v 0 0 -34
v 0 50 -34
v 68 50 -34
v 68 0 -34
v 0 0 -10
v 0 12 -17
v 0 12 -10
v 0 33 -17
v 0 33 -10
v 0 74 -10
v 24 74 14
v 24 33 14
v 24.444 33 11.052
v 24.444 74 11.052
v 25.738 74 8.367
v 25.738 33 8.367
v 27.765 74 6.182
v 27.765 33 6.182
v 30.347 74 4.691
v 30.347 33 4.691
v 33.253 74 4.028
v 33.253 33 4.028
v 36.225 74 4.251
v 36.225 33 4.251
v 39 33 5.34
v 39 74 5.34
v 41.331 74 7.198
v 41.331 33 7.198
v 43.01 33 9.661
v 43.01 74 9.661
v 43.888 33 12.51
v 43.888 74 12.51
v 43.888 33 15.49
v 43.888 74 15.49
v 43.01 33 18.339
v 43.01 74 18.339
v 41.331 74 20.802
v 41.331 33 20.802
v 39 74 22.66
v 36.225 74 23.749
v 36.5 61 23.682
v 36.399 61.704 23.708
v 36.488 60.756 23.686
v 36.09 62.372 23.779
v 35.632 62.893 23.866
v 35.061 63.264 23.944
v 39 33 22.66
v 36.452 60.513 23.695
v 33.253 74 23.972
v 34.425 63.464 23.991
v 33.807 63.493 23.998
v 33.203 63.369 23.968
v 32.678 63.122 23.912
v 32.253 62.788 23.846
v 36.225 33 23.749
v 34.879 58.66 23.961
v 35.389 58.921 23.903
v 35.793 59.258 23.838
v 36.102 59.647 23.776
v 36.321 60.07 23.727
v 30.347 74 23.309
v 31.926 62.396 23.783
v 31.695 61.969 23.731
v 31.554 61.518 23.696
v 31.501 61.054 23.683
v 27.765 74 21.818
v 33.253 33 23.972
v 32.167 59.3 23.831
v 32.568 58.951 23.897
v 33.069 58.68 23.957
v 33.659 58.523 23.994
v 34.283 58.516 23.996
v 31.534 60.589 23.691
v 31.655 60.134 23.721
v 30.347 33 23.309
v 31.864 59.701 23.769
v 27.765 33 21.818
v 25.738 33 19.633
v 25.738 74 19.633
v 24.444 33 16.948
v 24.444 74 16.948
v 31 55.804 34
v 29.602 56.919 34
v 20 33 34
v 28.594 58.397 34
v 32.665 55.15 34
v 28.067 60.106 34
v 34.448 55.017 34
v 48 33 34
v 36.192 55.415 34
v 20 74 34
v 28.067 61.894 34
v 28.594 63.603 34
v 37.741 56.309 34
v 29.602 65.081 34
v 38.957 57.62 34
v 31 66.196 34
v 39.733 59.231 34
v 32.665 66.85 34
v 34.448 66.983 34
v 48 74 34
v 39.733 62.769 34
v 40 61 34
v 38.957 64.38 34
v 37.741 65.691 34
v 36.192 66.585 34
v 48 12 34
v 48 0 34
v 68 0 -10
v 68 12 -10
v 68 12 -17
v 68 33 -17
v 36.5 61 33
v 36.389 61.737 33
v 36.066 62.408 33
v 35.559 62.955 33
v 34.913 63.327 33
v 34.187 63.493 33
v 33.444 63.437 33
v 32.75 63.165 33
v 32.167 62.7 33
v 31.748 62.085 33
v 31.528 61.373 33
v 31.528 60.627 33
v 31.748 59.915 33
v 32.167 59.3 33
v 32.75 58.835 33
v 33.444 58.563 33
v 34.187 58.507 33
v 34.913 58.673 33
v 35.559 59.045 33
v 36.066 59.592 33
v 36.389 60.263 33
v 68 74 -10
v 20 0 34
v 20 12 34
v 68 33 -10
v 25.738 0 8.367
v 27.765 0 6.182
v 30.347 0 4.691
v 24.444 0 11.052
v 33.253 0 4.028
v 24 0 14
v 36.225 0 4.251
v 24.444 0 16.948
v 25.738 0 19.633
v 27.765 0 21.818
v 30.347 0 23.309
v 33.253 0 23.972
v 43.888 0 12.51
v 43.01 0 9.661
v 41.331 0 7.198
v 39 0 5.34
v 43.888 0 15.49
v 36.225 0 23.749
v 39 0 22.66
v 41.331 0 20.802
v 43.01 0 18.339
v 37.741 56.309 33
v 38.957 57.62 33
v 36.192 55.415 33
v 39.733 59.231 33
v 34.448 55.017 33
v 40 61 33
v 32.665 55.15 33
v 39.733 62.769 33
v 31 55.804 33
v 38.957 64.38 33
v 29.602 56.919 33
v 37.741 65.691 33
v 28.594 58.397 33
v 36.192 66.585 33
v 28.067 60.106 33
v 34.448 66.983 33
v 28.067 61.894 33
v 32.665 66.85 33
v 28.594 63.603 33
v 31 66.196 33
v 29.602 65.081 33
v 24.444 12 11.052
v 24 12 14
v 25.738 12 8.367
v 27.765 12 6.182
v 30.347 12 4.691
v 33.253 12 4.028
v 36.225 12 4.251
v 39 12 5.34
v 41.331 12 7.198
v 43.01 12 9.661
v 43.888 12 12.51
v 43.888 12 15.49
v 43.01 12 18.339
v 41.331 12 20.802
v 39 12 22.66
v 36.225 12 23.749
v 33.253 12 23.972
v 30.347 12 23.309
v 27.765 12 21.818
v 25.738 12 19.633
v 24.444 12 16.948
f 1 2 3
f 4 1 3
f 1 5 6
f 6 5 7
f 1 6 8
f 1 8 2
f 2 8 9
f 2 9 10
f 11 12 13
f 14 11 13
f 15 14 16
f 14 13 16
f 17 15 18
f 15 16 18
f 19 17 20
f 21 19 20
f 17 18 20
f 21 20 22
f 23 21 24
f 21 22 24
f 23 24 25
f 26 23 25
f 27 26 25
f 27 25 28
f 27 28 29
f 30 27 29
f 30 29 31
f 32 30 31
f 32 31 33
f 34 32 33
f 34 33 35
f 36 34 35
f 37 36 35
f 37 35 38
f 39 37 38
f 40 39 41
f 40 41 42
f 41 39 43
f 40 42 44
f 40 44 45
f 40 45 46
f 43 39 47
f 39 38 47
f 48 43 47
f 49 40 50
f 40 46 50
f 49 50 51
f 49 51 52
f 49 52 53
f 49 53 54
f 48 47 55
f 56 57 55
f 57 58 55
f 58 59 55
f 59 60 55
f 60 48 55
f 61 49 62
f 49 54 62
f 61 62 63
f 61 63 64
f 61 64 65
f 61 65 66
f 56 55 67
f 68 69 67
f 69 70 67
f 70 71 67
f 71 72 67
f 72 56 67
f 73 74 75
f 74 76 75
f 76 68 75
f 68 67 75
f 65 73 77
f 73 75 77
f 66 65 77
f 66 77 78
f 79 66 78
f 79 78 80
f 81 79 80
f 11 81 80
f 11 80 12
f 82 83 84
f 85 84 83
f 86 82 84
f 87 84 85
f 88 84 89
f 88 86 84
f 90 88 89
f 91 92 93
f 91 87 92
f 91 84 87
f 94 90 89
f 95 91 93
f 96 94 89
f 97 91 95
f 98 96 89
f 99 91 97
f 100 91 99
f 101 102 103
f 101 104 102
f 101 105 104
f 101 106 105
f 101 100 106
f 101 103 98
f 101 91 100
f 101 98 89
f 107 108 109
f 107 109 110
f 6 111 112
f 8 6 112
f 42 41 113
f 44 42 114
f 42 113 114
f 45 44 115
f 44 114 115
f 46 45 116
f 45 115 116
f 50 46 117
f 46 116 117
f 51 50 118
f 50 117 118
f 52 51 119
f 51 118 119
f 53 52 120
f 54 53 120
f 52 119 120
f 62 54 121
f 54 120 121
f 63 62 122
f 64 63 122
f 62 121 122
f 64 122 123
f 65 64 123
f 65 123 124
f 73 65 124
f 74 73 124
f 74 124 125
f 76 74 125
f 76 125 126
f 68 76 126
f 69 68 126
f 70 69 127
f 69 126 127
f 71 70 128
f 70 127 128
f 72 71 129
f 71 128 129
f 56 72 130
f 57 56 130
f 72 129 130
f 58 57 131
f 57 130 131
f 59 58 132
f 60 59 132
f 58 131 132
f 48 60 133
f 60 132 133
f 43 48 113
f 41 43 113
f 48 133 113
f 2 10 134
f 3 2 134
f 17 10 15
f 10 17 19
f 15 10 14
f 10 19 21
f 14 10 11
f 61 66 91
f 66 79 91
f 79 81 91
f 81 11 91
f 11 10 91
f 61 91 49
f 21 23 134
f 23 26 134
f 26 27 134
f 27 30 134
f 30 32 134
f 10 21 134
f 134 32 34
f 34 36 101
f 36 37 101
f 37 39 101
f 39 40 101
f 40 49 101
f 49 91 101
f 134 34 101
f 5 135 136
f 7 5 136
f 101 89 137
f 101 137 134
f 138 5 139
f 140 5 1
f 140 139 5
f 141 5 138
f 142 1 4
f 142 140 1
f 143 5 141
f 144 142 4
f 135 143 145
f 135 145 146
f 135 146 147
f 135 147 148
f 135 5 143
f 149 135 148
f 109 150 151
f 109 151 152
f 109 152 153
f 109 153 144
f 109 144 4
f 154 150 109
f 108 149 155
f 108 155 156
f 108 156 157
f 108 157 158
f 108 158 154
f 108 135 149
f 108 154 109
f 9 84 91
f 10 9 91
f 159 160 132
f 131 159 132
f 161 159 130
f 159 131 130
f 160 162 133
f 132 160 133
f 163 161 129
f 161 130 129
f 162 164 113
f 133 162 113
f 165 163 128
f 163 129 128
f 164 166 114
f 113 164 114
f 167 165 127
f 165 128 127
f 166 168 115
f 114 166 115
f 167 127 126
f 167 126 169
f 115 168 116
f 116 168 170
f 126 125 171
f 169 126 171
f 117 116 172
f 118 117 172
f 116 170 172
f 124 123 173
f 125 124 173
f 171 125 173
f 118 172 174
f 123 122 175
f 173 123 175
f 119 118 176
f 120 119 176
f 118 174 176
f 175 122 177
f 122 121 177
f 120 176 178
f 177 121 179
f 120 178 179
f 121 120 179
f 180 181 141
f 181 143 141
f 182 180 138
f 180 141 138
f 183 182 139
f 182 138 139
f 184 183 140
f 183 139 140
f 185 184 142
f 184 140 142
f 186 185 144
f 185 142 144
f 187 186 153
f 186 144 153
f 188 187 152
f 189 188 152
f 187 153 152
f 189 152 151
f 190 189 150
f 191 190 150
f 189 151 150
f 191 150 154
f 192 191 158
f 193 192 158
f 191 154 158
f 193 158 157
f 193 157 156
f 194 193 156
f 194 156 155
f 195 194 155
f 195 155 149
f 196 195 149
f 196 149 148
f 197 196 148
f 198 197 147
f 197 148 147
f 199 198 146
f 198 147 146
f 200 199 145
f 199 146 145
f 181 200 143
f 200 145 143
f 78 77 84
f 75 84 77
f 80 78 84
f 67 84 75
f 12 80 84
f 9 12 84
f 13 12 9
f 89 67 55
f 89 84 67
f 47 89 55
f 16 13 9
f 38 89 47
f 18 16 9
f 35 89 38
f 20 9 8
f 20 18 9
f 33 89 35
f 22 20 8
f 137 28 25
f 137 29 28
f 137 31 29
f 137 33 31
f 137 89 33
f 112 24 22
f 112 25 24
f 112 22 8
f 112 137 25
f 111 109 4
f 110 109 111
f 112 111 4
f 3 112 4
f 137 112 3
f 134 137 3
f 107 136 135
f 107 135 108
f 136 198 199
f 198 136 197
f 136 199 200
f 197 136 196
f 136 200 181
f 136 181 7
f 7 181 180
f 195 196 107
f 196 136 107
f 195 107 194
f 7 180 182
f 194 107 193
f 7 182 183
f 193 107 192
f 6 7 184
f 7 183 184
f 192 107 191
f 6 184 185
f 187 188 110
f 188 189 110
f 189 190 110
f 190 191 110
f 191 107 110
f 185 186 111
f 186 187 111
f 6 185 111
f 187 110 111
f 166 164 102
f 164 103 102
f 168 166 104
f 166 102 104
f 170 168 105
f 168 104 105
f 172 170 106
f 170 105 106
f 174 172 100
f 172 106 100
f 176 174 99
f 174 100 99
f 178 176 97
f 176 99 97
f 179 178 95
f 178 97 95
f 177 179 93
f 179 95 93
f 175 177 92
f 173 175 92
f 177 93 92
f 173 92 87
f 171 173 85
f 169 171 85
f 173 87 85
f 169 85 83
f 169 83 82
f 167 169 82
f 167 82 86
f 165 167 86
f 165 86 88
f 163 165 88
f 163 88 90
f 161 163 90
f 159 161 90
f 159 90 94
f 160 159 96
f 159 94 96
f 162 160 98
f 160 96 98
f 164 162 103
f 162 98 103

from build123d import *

# Parameters (mm, degrees)
ESQUISSE1_W             = 68
ESQUISSE1_H             = 74
BOSS_EXTRU_1_DEPTH      = 34
ESQUISSE2_W             = 51
ESQUISSE2_H             = 21
ENL_V_MAT_EXTRU_1_DEPTH = 107.094297679
CHANFREIN1_SIZE         = 44
CHANFREIN1_SIZE2        = 20
CHANFREIN2_SIZE         = 44
CHANFREIN2_SIZE2        = 20
CHANFREIN3_SIZE         = 24
PER_AGE1_D              = 20
PER_AGE1_DEPTH          = 74
PER_AGE1_TIP            = 6.00860619


# Read off the part's stored shape, not the designer's step: Perçage2
with BuildPart() as part:
    # Esquisse1 → Boss.-Extru.1 (new, symmetric)
    with BuildSketch(Plane.XY):
        with Locations((34, 37)):
            Rectangle(ESQUISSE1_W, ESQUISSE1_H)
    extrude(amount=BOSS_EXTRU_1_DEPTH, both=True)

    # Esquisse2 → Enlèv. mat.-Extru.1 (cut, through all)
    with BuildSketch(Plane(origin=(68, 0, 0), x_dir=(0, 0, -1), z_dir=(1, 0, 0))):
        with Locations((-8.5, 22.5)):
            Rectangle(ESQUISSE2_W, ESQUISSE2_H)
    extrude(amount=-ENL_V_MAT_EXTRU_1_DEPTH, mode=Mode.SUBTRACT)

    # Chanfrein1
    chanfrein1_edges = [part.edges().sort_by_distance(p)[0] for p in [
        (68, 6, 34),
        (68, 53.5, 34),
    ]]
    chanfrein1_side = [part.faces().sort_by_distance(p)[0] for p in [
        (68, 40.920600858, -2.298283262),
    ]]
    chamfer(chanfrein1_edges, length=CHANFREIN1_SIZE, length2=CHANFREIN1_SIZE2, reference=chanfrein1_side[0])

    # Chanfrein2
    chanfrein2_edges = [part.edges().sort_by_distance(p)[0] for p in [
        (0, 6, 34),
        (0, 53.5, 34),
    ]]
    chanfrein2_side = [part.faces().sort_by_distance(p)[0] for p in [
        (0, 40.920600858, -2.298283262),
    ]]
    chamfer(chanfrein2_edges, length=CHANFREIN2_SIZE, length2=CHANFREIN2_SIZE2, reference=chanfrein2_side[0])

    # Chanfrein3
    chanfrein3_edges = [part.edges().sort_by_distance(p)[0] for p in [
        (34, 74, -34),
    ]]
    chamfer(chanfrein3_edges, length=CHANFREIN3_SIZE)

    # Perçage1
    with Locations(Plane(origin=(0, 74, 0), x_dir=(1, 0, 0), z_dir=(0, 1, 0))):
        with Locations((34, -14)):
            Hole(PER_AGE1_D / 2, depth=PER_AGE1_DEPTH)
            with Locations((0, 0, -(PER_AGE1_DEPTH + PER_AGE1_TIP / 2))):  # 118° drill point
                Cone(0, PER_AGE1_D / 2, PER_AGE1_TIP, mode=Mode.SUBTRACT)

    # Perçage2 outline → Perçage2 (revolve, cut)
    with BuildSketch(Plane(origin=(34, 61, 0), x_dir=(1, 0, 0), z_dir=(0, -1, 0))):
        Polygon((0, 23.682322777), (2.5, 23.682322777), (2.5, 33), (6, 33), (6, 34), (0, 34), align=None)
    revolve(axis=Axis((34, 61, 0), (0, 0, 1)), mode=Mode.SUBTRACT)


solid = part.part
